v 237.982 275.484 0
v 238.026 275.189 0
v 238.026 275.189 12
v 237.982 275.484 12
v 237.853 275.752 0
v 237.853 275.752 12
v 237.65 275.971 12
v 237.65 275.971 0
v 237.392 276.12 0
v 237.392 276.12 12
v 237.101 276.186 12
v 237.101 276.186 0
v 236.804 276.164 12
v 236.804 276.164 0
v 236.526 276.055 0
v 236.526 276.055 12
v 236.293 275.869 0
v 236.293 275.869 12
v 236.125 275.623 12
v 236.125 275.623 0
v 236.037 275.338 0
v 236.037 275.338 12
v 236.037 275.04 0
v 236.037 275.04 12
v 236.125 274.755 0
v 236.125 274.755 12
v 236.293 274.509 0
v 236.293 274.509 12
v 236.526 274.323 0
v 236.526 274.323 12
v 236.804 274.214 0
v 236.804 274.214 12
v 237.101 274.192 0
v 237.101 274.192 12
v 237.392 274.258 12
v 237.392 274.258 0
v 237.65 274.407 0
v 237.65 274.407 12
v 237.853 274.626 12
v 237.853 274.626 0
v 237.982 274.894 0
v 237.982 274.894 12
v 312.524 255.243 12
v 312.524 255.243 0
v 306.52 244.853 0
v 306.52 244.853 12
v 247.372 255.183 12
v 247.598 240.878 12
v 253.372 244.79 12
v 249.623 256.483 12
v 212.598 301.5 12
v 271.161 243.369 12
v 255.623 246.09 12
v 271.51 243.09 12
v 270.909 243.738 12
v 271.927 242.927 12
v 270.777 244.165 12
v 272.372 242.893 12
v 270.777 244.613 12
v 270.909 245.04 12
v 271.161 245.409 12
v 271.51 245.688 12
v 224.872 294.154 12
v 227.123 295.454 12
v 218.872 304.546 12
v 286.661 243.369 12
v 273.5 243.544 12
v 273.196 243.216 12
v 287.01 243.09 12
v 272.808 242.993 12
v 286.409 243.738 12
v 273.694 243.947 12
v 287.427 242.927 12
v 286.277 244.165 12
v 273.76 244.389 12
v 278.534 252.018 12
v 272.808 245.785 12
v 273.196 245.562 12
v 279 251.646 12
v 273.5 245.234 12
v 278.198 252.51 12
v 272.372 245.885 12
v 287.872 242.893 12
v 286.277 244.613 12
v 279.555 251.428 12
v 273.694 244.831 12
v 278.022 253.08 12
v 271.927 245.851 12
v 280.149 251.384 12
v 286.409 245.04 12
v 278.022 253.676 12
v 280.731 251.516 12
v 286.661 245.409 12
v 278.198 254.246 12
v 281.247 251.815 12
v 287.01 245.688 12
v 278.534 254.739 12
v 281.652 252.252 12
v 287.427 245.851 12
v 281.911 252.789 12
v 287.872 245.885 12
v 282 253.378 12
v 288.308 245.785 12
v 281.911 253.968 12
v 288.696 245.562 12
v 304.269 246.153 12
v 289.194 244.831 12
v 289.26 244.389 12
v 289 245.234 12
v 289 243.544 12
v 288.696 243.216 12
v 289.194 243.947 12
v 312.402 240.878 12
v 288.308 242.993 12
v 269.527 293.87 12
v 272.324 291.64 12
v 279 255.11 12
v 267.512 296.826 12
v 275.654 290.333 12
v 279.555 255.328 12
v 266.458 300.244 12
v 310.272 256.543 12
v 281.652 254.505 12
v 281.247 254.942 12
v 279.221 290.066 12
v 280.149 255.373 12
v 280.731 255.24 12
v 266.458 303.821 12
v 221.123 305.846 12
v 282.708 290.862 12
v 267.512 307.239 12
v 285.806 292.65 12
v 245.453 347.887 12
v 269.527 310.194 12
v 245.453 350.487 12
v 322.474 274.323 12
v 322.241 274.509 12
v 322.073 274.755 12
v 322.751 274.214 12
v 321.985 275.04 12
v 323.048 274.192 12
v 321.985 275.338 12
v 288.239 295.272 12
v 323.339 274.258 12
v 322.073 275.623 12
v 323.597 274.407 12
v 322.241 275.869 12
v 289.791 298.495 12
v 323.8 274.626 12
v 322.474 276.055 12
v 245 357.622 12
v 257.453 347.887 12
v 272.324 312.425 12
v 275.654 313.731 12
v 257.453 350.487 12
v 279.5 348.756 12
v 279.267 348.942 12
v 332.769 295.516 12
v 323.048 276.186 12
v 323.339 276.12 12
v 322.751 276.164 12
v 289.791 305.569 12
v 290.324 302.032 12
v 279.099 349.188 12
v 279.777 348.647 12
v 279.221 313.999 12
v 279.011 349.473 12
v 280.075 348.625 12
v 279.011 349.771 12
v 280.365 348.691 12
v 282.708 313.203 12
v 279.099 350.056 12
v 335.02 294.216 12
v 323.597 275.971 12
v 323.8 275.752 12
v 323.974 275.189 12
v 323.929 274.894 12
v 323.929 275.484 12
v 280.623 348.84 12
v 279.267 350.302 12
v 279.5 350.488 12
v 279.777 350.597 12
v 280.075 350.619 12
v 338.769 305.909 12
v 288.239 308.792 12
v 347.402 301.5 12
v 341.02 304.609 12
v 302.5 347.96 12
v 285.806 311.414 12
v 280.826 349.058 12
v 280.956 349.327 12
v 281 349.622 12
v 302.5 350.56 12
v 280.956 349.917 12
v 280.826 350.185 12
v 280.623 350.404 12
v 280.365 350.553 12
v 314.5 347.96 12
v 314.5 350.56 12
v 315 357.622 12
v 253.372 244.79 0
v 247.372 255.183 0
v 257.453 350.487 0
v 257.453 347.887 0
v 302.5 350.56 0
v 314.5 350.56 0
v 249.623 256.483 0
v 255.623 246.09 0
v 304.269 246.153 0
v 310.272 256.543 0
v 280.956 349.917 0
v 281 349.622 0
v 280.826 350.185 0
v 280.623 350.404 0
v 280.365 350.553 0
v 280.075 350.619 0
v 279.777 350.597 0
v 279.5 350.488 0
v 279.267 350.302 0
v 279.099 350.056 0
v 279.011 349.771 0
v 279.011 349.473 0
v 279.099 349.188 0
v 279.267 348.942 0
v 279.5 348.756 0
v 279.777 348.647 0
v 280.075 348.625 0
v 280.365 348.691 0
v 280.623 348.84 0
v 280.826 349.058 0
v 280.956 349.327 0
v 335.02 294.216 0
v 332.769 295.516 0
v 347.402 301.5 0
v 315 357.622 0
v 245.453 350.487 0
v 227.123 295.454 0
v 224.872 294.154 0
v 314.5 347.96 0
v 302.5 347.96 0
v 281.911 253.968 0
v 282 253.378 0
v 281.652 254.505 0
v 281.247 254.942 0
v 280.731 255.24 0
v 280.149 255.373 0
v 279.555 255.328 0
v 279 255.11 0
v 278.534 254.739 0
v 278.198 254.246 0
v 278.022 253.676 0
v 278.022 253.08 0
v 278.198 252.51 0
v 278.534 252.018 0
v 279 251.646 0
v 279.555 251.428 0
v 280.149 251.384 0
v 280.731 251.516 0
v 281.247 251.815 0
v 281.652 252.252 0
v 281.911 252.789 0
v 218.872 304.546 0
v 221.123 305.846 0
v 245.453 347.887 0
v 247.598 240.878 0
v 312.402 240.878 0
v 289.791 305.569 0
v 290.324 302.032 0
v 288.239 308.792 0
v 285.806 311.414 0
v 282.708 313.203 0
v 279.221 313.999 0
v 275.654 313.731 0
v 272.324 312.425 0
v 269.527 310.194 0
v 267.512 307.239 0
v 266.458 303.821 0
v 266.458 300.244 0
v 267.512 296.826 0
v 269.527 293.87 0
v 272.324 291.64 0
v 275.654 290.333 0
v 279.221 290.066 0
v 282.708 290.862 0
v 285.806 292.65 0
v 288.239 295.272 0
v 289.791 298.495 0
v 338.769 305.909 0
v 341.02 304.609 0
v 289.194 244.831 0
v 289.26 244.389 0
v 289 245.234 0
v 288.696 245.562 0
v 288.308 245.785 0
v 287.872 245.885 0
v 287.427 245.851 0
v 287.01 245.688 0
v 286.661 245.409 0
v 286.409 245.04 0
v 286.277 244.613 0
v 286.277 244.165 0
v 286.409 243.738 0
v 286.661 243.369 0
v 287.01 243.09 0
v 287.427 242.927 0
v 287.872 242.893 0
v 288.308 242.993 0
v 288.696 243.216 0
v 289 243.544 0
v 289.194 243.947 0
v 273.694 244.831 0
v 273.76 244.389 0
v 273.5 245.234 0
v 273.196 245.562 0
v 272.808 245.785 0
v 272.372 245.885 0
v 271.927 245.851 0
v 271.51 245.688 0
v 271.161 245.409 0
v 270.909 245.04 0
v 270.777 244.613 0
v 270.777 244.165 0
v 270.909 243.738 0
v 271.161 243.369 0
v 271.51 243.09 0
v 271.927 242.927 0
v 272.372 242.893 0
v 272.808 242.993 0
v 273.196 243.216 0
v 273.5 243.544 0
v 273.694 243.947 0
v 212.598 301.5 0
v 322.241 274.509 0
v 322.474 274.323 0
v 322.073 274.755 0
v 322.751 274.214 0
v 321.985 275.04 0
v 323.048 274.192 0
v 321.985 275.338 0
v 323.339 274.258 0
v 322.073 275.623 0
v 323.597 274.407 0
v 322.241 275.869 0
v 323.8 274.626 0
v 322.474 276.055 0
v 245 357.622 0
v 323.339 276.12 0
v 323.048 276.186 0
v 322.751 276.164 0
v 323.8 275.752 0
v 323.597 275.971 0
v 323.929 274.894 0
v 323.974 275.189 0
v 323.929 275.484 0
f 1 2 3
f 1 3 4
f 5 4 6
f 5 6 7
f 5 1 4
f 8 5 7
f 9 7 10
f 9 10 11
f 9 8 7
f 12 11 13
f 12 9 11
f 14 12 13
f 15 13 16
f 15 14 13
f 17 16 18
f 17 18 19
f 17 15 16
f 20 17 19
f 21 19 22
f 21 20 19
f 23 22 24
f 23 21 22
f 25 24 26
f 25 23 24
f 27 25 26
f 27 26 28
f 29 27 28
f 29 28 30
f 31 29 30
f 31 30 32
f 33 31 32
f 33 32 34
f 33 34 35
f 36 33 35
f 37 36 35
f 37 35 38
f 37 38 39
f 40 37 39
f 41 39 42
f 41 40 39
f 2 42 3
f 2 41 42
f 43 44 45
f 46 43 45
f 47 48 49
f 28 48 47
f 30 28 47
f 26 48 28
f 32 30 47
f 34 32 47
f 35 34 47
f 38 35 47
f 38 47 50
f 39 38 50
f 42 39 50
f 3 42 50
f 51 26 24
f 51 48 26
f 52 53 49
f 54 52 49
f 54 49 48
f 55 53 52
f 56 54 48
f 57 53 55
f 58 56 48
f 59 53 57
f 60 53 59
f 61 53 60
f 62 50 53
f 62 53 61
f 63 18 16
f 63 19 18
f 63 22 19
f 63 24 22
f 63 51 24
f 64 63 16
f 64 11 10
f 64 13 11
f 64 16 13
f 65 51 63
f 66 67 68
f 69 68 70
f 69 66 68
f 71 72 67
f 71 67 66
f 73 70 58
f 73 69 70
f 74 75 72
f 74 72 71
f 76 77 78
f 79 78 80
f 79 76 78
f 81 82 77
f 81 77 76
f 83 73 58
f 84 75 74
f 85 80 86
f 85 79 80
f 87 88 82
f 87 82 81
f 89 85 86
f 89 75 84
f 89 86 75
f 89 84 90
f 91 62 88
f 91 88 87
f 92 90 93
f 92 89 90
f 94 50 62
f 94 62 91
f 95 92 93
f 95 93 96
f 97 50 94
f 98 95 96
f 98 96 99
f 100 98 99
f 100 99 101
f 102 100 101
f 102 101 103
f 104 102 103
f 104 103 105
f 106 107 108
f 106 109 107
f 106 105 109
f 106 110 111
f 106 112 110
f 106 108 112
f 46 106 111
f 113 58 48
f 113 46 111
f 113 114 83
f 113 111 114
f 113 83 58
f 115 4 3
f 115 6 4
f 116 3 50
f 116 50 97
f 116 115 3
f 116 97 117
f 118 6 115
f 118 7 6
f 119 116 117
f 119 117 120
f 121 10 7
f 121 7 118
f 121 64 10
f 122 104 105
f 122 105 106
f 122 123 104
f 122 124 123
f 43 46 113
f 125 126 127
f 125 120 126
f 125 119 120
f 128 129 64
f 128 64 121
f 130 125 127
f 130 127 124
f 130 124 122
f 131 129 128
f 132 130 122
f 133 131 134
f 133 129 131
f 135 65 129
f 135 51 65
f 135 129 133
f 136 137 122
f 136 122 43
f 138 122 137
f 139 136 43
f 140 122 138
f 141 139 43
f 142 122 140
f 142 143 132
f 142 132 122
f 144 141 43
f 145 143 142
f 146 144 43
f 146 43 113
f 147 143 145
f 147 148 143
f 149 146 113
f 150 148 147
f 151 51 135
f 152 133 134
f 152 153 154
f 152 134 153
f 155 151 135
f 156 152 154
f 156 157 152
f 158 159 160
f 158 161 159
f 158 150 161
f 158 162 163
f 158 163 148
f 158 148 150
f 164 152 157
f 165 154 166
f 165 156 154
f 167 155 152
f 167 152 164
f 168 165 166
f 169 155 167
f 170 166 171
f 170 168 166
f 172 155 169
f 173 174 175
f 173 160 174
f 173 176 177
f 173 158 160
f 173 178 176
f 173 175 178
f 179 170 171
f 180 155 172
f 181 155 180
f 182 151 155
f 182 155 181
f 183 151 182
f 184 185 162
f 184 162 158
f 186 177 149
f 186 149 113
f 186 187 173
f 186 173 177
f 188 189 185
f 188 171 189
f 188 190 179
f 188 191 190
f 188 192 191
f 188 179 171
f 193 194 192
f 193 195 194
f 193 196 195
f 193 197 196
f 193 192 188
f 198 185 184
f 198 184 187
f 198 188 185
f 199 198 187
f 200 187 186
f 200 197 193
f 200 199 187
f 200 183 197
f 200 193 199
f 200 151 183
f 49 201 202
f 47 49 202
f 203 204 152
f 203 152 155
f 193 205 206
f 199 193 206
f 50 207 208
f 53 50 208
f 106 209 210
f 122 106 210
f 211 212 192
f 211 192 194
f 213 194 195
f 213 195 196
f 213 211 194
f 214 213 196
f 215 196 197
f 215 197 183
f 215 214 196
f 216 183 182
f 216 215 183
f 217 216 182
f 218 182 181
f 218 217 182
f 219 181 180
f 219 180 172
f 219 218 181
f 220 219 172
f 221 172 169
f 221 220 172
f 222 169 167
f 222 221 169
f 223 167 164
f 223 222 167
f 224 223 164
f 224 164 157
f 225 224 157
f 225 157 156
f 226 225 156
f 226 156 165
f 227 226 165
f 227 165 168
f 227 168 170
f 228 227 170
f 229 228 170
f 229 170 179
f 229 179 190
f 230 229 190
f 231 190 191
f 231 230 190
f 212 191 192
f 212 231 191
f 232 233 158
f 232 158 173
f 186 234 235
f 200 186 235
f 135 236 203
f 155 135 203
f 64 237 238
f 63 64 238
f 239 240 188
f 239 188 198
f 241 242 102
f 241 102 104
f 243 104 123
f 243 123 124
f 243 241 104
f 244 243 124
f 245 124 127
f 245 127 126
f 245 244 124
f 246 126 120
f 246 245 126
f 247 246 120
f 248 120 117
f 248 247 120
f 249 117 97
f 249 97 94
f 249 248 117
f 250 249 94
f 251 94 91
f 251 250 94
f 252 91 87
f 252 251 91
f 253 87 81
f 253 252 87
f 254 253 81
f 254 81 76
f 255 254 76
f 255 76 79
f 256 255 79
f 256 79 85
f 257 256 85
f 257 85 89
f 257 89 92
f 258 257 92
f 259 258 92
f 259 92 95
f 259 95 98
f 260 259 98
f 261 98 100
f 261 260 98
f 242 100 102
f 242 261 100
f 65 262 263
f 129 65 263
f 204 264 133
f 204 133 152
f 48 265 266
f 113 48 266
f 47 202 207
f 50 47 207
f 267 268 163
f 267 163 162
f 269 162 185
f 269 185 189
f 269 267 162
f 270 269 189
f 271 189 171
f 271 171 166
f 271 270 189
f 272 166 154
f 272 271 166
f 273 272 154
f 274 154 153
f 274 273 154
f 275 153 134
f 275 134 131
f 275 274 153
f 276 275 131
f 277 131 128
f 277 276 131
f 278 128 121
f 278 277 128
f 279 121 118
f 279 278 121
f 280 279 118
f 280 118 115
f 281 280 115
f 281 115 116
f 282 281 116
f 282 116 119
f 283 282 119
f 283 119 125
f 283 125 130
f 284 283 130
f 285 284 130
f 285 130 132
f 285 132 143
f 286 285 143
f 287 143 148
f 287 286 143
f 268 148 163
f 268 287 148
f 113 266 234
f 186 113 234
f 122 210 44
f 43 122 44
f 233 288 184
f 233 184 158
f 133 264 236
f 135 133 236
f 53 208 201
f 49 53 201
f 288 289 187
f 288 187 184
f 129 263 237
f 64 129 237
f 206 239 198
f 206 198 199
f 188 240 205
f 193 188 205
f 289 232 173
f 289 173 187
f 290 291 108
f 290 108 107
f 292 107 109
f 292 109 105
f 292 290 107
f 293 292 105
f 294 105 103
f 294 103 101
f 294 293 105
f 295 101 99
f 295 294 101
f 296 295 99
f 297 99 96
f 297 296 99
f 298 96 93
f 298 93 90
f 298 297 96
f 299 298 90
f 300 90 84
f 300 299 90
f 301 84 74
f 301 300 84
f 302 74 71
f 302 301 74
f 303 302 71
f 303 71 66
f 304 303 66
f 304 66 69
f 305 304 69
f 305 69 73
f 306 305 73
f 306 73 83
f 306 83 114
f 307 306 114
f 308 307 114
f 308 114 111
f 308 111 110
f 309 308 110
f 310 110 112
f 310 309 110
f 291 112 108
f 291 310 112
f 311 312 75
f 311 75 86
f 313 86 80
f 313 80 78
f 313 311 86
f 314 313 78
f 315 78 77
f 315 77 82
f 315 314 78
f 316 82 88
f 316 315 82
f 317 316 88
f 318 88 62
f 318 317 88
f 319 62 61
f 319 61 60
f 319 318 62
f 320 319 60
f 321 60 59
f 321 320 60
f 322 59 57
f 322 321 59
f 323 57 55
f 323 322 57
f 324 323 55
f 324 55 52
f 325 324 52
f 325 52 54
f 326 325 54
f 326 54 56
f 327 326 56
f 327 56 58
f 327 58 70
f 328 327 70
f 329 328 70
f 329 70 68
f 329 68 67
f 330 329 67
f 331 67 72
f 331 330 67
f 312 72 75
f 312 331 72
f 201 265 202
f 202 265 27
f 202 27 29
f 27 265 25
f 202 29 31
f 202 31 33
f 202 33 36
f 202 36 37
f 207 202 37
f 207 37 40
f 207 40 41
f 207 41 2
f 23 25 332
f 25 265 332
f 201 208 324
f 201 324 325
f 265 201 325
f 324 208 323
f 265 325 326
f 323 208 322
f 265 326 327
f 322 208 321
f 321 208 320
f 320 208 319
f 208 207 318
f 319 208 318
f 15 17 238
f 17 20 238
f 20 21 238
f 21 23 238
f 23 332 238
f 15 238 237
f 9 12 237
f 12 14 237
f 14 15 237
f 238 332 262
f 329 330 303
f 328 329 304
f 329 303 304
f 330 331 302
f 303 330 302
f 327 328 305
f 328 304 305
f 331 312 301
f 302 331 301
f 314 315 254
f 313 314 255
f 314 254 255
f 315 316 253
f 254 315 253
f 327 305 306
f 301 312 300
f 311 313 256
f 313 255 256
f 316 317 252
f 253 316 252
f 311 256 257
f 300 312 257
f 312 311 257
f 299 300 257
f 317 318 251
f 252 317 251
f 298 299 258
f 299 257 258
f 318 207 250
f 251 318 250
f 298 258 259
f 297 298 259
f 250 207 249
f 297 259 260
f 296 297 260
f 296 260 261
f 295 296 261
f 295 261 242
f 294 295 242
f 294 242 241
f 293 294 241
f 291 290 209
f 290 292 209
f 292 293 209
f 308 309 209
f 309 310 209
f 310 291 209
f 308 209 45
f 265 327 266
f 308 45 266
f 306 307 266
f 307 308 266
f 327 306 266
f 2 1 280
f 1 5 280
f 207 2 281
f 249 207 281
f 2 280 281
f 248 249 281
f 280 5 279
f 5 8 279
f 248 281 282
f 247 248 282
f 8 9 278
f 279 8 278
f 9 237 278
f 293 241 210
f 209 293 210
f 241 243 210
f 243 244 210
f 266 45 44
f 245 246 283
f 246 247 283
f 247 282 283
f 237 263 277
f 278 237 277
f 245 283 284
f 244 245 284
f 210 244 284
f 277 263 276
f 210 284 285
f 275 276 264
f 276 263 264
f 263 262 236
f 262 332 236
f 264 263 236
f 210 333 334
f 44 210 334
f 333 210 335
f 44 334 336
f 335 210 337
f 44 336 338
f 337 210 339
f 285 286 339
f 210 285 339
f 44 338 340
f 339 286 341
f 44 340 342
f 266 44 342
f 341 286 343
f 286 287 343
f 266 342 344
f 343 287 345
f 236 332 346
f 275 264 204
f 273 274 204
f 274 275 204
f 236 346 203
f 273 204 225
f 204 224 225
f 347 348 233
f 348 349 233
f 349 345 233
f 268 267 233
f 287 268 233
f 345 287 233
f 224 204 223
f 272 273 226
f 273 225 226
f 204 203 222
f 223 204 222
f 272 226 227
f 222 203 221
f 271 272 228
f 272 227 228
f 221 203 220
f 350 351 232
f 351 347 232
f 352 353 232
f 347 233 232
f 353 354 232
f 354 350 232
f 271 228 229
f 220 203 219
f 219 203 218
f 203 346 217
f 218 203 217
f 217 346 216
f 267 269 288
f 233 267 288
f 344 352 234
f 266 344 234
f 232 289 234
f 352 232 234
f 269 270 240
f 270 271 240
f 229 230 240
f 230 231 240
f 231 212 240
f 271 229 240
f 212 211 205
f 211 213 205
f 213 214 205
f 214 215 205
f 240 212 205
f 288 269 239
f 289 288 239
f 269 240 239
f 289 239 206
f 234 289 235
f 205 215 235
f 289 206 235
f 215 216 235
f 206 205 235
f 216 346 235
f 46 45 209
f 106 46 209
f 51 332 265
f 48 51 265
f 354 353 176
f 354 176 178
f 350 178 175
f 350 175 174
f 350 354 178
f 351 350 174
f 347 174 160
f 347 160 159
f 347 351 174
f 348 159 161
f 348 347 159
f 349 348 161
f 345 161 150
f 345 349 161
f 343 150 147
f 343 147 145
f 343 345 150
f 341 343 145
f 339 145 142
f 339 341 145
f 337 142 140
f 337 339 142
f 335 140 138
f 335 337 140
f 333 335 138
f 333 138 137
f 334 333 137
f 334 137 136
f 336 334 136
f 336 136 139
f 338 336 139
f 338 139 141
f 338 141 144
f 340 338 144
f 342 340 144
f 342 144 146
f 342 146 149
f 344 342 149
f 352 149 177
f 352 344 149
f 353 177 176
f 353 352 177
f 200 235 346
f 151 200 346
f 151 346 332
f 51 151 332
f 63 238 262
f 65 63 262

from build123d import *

# Parameters (mm, degrees)
ESBO_O1_R                = 2
ESBO_O1_R_2              = 1.5
ESBO_O1_R_3              = 1
ESBO_O1_R_4              = 12
ESBO_O1_W                = 12
ESBO_O1_H                = 2.6
RESSALTO_EXTRUS_O1_DEPTH = 12


with BuildPart() as part:
    # Esboço1 → Ressalto-extrusão1 (new body)
    with BuildSketch(Plane.XY):
        Polygon((312.401923789, 240.878221735), (347.401923789, 301.5), (315, 357.621778265), (245, 357.621778265), (212.598076211, 301.5), (247.598076211, 240.878221735), align=None)
        with Locations((280, 253.378221735)):
            Circle(ESBO_O1_R, mode=Mode.SUBTRACT)
        with Locations((272.260343171, 244.388972359)):
            Circle(ESBO_O1_R_2, mode=Mode.SUBTRACT)
        with Locations((287.760343171, 244.388972359)):
            Circle(ESBO_O1_R_2, mode=Mode.SUBTRACT)
        with Locations((280, 349.621778265)):
            Circle(ESBO_O1_R_3, mode=Mode.SUBTRACT)
        with Locations((237.026279442, 275.189110868)):
            Circle(ESBO_O1_R_3, mode=Mode.SUBTRACT)
        with Locations((322.973720558, 275.189110868)):
            Circle(ESBO_O1_R_3, mode=Mode.SUBTRACT)
        with Locations((278.32399049, 302.032244112)):
            Circle(ESBO_O1_R_4, mode=Mode.SUBTRACT)
        with Locations((251.453146627, 349.186651246)):
            Rectangle(ESBO_O1_W, ESBO_O1_H, mode=Mode.SUBTRACT)
        with Locations((308.5, 349.259600438)):
            Rectangle(ESBO_O1_W, ESBO_O1_H, mode=Mode.SUBTRACT)
        Polygon((332.76851184, 295.516364843), (335.020177889, 294.216364843), (341.020177889, 304.608669688), (338.76851184, 305.908669688), align=None, mode=Mode.SUBTRACT)
        Polygon((310.272092192, 256.543153732), (312.523758242, 255.243153732), (306.520177889, 244.852916827), (304.26851184, 246.152916827), align=None, mode=Mode.SUBTRACT)
        Polygon((255.623234985, 246.090416827), (253.371568935, 244.790416827), (247.371568935, 255.182721672), (249.623234985, 256.482721672), align=None, mode=Mode.SUBTRACT)
        Polygon((227.123234985, 295.453864843), (224.871568935, 294.153864843), (218.871568935, 304.546169688), (221.123234985, 305.846169688), align=None, mode=Mode.SUBTRACT)
    extrude(amount=RESSALTO_EXTRUS_O1_DEPTH)


solid = part.part
